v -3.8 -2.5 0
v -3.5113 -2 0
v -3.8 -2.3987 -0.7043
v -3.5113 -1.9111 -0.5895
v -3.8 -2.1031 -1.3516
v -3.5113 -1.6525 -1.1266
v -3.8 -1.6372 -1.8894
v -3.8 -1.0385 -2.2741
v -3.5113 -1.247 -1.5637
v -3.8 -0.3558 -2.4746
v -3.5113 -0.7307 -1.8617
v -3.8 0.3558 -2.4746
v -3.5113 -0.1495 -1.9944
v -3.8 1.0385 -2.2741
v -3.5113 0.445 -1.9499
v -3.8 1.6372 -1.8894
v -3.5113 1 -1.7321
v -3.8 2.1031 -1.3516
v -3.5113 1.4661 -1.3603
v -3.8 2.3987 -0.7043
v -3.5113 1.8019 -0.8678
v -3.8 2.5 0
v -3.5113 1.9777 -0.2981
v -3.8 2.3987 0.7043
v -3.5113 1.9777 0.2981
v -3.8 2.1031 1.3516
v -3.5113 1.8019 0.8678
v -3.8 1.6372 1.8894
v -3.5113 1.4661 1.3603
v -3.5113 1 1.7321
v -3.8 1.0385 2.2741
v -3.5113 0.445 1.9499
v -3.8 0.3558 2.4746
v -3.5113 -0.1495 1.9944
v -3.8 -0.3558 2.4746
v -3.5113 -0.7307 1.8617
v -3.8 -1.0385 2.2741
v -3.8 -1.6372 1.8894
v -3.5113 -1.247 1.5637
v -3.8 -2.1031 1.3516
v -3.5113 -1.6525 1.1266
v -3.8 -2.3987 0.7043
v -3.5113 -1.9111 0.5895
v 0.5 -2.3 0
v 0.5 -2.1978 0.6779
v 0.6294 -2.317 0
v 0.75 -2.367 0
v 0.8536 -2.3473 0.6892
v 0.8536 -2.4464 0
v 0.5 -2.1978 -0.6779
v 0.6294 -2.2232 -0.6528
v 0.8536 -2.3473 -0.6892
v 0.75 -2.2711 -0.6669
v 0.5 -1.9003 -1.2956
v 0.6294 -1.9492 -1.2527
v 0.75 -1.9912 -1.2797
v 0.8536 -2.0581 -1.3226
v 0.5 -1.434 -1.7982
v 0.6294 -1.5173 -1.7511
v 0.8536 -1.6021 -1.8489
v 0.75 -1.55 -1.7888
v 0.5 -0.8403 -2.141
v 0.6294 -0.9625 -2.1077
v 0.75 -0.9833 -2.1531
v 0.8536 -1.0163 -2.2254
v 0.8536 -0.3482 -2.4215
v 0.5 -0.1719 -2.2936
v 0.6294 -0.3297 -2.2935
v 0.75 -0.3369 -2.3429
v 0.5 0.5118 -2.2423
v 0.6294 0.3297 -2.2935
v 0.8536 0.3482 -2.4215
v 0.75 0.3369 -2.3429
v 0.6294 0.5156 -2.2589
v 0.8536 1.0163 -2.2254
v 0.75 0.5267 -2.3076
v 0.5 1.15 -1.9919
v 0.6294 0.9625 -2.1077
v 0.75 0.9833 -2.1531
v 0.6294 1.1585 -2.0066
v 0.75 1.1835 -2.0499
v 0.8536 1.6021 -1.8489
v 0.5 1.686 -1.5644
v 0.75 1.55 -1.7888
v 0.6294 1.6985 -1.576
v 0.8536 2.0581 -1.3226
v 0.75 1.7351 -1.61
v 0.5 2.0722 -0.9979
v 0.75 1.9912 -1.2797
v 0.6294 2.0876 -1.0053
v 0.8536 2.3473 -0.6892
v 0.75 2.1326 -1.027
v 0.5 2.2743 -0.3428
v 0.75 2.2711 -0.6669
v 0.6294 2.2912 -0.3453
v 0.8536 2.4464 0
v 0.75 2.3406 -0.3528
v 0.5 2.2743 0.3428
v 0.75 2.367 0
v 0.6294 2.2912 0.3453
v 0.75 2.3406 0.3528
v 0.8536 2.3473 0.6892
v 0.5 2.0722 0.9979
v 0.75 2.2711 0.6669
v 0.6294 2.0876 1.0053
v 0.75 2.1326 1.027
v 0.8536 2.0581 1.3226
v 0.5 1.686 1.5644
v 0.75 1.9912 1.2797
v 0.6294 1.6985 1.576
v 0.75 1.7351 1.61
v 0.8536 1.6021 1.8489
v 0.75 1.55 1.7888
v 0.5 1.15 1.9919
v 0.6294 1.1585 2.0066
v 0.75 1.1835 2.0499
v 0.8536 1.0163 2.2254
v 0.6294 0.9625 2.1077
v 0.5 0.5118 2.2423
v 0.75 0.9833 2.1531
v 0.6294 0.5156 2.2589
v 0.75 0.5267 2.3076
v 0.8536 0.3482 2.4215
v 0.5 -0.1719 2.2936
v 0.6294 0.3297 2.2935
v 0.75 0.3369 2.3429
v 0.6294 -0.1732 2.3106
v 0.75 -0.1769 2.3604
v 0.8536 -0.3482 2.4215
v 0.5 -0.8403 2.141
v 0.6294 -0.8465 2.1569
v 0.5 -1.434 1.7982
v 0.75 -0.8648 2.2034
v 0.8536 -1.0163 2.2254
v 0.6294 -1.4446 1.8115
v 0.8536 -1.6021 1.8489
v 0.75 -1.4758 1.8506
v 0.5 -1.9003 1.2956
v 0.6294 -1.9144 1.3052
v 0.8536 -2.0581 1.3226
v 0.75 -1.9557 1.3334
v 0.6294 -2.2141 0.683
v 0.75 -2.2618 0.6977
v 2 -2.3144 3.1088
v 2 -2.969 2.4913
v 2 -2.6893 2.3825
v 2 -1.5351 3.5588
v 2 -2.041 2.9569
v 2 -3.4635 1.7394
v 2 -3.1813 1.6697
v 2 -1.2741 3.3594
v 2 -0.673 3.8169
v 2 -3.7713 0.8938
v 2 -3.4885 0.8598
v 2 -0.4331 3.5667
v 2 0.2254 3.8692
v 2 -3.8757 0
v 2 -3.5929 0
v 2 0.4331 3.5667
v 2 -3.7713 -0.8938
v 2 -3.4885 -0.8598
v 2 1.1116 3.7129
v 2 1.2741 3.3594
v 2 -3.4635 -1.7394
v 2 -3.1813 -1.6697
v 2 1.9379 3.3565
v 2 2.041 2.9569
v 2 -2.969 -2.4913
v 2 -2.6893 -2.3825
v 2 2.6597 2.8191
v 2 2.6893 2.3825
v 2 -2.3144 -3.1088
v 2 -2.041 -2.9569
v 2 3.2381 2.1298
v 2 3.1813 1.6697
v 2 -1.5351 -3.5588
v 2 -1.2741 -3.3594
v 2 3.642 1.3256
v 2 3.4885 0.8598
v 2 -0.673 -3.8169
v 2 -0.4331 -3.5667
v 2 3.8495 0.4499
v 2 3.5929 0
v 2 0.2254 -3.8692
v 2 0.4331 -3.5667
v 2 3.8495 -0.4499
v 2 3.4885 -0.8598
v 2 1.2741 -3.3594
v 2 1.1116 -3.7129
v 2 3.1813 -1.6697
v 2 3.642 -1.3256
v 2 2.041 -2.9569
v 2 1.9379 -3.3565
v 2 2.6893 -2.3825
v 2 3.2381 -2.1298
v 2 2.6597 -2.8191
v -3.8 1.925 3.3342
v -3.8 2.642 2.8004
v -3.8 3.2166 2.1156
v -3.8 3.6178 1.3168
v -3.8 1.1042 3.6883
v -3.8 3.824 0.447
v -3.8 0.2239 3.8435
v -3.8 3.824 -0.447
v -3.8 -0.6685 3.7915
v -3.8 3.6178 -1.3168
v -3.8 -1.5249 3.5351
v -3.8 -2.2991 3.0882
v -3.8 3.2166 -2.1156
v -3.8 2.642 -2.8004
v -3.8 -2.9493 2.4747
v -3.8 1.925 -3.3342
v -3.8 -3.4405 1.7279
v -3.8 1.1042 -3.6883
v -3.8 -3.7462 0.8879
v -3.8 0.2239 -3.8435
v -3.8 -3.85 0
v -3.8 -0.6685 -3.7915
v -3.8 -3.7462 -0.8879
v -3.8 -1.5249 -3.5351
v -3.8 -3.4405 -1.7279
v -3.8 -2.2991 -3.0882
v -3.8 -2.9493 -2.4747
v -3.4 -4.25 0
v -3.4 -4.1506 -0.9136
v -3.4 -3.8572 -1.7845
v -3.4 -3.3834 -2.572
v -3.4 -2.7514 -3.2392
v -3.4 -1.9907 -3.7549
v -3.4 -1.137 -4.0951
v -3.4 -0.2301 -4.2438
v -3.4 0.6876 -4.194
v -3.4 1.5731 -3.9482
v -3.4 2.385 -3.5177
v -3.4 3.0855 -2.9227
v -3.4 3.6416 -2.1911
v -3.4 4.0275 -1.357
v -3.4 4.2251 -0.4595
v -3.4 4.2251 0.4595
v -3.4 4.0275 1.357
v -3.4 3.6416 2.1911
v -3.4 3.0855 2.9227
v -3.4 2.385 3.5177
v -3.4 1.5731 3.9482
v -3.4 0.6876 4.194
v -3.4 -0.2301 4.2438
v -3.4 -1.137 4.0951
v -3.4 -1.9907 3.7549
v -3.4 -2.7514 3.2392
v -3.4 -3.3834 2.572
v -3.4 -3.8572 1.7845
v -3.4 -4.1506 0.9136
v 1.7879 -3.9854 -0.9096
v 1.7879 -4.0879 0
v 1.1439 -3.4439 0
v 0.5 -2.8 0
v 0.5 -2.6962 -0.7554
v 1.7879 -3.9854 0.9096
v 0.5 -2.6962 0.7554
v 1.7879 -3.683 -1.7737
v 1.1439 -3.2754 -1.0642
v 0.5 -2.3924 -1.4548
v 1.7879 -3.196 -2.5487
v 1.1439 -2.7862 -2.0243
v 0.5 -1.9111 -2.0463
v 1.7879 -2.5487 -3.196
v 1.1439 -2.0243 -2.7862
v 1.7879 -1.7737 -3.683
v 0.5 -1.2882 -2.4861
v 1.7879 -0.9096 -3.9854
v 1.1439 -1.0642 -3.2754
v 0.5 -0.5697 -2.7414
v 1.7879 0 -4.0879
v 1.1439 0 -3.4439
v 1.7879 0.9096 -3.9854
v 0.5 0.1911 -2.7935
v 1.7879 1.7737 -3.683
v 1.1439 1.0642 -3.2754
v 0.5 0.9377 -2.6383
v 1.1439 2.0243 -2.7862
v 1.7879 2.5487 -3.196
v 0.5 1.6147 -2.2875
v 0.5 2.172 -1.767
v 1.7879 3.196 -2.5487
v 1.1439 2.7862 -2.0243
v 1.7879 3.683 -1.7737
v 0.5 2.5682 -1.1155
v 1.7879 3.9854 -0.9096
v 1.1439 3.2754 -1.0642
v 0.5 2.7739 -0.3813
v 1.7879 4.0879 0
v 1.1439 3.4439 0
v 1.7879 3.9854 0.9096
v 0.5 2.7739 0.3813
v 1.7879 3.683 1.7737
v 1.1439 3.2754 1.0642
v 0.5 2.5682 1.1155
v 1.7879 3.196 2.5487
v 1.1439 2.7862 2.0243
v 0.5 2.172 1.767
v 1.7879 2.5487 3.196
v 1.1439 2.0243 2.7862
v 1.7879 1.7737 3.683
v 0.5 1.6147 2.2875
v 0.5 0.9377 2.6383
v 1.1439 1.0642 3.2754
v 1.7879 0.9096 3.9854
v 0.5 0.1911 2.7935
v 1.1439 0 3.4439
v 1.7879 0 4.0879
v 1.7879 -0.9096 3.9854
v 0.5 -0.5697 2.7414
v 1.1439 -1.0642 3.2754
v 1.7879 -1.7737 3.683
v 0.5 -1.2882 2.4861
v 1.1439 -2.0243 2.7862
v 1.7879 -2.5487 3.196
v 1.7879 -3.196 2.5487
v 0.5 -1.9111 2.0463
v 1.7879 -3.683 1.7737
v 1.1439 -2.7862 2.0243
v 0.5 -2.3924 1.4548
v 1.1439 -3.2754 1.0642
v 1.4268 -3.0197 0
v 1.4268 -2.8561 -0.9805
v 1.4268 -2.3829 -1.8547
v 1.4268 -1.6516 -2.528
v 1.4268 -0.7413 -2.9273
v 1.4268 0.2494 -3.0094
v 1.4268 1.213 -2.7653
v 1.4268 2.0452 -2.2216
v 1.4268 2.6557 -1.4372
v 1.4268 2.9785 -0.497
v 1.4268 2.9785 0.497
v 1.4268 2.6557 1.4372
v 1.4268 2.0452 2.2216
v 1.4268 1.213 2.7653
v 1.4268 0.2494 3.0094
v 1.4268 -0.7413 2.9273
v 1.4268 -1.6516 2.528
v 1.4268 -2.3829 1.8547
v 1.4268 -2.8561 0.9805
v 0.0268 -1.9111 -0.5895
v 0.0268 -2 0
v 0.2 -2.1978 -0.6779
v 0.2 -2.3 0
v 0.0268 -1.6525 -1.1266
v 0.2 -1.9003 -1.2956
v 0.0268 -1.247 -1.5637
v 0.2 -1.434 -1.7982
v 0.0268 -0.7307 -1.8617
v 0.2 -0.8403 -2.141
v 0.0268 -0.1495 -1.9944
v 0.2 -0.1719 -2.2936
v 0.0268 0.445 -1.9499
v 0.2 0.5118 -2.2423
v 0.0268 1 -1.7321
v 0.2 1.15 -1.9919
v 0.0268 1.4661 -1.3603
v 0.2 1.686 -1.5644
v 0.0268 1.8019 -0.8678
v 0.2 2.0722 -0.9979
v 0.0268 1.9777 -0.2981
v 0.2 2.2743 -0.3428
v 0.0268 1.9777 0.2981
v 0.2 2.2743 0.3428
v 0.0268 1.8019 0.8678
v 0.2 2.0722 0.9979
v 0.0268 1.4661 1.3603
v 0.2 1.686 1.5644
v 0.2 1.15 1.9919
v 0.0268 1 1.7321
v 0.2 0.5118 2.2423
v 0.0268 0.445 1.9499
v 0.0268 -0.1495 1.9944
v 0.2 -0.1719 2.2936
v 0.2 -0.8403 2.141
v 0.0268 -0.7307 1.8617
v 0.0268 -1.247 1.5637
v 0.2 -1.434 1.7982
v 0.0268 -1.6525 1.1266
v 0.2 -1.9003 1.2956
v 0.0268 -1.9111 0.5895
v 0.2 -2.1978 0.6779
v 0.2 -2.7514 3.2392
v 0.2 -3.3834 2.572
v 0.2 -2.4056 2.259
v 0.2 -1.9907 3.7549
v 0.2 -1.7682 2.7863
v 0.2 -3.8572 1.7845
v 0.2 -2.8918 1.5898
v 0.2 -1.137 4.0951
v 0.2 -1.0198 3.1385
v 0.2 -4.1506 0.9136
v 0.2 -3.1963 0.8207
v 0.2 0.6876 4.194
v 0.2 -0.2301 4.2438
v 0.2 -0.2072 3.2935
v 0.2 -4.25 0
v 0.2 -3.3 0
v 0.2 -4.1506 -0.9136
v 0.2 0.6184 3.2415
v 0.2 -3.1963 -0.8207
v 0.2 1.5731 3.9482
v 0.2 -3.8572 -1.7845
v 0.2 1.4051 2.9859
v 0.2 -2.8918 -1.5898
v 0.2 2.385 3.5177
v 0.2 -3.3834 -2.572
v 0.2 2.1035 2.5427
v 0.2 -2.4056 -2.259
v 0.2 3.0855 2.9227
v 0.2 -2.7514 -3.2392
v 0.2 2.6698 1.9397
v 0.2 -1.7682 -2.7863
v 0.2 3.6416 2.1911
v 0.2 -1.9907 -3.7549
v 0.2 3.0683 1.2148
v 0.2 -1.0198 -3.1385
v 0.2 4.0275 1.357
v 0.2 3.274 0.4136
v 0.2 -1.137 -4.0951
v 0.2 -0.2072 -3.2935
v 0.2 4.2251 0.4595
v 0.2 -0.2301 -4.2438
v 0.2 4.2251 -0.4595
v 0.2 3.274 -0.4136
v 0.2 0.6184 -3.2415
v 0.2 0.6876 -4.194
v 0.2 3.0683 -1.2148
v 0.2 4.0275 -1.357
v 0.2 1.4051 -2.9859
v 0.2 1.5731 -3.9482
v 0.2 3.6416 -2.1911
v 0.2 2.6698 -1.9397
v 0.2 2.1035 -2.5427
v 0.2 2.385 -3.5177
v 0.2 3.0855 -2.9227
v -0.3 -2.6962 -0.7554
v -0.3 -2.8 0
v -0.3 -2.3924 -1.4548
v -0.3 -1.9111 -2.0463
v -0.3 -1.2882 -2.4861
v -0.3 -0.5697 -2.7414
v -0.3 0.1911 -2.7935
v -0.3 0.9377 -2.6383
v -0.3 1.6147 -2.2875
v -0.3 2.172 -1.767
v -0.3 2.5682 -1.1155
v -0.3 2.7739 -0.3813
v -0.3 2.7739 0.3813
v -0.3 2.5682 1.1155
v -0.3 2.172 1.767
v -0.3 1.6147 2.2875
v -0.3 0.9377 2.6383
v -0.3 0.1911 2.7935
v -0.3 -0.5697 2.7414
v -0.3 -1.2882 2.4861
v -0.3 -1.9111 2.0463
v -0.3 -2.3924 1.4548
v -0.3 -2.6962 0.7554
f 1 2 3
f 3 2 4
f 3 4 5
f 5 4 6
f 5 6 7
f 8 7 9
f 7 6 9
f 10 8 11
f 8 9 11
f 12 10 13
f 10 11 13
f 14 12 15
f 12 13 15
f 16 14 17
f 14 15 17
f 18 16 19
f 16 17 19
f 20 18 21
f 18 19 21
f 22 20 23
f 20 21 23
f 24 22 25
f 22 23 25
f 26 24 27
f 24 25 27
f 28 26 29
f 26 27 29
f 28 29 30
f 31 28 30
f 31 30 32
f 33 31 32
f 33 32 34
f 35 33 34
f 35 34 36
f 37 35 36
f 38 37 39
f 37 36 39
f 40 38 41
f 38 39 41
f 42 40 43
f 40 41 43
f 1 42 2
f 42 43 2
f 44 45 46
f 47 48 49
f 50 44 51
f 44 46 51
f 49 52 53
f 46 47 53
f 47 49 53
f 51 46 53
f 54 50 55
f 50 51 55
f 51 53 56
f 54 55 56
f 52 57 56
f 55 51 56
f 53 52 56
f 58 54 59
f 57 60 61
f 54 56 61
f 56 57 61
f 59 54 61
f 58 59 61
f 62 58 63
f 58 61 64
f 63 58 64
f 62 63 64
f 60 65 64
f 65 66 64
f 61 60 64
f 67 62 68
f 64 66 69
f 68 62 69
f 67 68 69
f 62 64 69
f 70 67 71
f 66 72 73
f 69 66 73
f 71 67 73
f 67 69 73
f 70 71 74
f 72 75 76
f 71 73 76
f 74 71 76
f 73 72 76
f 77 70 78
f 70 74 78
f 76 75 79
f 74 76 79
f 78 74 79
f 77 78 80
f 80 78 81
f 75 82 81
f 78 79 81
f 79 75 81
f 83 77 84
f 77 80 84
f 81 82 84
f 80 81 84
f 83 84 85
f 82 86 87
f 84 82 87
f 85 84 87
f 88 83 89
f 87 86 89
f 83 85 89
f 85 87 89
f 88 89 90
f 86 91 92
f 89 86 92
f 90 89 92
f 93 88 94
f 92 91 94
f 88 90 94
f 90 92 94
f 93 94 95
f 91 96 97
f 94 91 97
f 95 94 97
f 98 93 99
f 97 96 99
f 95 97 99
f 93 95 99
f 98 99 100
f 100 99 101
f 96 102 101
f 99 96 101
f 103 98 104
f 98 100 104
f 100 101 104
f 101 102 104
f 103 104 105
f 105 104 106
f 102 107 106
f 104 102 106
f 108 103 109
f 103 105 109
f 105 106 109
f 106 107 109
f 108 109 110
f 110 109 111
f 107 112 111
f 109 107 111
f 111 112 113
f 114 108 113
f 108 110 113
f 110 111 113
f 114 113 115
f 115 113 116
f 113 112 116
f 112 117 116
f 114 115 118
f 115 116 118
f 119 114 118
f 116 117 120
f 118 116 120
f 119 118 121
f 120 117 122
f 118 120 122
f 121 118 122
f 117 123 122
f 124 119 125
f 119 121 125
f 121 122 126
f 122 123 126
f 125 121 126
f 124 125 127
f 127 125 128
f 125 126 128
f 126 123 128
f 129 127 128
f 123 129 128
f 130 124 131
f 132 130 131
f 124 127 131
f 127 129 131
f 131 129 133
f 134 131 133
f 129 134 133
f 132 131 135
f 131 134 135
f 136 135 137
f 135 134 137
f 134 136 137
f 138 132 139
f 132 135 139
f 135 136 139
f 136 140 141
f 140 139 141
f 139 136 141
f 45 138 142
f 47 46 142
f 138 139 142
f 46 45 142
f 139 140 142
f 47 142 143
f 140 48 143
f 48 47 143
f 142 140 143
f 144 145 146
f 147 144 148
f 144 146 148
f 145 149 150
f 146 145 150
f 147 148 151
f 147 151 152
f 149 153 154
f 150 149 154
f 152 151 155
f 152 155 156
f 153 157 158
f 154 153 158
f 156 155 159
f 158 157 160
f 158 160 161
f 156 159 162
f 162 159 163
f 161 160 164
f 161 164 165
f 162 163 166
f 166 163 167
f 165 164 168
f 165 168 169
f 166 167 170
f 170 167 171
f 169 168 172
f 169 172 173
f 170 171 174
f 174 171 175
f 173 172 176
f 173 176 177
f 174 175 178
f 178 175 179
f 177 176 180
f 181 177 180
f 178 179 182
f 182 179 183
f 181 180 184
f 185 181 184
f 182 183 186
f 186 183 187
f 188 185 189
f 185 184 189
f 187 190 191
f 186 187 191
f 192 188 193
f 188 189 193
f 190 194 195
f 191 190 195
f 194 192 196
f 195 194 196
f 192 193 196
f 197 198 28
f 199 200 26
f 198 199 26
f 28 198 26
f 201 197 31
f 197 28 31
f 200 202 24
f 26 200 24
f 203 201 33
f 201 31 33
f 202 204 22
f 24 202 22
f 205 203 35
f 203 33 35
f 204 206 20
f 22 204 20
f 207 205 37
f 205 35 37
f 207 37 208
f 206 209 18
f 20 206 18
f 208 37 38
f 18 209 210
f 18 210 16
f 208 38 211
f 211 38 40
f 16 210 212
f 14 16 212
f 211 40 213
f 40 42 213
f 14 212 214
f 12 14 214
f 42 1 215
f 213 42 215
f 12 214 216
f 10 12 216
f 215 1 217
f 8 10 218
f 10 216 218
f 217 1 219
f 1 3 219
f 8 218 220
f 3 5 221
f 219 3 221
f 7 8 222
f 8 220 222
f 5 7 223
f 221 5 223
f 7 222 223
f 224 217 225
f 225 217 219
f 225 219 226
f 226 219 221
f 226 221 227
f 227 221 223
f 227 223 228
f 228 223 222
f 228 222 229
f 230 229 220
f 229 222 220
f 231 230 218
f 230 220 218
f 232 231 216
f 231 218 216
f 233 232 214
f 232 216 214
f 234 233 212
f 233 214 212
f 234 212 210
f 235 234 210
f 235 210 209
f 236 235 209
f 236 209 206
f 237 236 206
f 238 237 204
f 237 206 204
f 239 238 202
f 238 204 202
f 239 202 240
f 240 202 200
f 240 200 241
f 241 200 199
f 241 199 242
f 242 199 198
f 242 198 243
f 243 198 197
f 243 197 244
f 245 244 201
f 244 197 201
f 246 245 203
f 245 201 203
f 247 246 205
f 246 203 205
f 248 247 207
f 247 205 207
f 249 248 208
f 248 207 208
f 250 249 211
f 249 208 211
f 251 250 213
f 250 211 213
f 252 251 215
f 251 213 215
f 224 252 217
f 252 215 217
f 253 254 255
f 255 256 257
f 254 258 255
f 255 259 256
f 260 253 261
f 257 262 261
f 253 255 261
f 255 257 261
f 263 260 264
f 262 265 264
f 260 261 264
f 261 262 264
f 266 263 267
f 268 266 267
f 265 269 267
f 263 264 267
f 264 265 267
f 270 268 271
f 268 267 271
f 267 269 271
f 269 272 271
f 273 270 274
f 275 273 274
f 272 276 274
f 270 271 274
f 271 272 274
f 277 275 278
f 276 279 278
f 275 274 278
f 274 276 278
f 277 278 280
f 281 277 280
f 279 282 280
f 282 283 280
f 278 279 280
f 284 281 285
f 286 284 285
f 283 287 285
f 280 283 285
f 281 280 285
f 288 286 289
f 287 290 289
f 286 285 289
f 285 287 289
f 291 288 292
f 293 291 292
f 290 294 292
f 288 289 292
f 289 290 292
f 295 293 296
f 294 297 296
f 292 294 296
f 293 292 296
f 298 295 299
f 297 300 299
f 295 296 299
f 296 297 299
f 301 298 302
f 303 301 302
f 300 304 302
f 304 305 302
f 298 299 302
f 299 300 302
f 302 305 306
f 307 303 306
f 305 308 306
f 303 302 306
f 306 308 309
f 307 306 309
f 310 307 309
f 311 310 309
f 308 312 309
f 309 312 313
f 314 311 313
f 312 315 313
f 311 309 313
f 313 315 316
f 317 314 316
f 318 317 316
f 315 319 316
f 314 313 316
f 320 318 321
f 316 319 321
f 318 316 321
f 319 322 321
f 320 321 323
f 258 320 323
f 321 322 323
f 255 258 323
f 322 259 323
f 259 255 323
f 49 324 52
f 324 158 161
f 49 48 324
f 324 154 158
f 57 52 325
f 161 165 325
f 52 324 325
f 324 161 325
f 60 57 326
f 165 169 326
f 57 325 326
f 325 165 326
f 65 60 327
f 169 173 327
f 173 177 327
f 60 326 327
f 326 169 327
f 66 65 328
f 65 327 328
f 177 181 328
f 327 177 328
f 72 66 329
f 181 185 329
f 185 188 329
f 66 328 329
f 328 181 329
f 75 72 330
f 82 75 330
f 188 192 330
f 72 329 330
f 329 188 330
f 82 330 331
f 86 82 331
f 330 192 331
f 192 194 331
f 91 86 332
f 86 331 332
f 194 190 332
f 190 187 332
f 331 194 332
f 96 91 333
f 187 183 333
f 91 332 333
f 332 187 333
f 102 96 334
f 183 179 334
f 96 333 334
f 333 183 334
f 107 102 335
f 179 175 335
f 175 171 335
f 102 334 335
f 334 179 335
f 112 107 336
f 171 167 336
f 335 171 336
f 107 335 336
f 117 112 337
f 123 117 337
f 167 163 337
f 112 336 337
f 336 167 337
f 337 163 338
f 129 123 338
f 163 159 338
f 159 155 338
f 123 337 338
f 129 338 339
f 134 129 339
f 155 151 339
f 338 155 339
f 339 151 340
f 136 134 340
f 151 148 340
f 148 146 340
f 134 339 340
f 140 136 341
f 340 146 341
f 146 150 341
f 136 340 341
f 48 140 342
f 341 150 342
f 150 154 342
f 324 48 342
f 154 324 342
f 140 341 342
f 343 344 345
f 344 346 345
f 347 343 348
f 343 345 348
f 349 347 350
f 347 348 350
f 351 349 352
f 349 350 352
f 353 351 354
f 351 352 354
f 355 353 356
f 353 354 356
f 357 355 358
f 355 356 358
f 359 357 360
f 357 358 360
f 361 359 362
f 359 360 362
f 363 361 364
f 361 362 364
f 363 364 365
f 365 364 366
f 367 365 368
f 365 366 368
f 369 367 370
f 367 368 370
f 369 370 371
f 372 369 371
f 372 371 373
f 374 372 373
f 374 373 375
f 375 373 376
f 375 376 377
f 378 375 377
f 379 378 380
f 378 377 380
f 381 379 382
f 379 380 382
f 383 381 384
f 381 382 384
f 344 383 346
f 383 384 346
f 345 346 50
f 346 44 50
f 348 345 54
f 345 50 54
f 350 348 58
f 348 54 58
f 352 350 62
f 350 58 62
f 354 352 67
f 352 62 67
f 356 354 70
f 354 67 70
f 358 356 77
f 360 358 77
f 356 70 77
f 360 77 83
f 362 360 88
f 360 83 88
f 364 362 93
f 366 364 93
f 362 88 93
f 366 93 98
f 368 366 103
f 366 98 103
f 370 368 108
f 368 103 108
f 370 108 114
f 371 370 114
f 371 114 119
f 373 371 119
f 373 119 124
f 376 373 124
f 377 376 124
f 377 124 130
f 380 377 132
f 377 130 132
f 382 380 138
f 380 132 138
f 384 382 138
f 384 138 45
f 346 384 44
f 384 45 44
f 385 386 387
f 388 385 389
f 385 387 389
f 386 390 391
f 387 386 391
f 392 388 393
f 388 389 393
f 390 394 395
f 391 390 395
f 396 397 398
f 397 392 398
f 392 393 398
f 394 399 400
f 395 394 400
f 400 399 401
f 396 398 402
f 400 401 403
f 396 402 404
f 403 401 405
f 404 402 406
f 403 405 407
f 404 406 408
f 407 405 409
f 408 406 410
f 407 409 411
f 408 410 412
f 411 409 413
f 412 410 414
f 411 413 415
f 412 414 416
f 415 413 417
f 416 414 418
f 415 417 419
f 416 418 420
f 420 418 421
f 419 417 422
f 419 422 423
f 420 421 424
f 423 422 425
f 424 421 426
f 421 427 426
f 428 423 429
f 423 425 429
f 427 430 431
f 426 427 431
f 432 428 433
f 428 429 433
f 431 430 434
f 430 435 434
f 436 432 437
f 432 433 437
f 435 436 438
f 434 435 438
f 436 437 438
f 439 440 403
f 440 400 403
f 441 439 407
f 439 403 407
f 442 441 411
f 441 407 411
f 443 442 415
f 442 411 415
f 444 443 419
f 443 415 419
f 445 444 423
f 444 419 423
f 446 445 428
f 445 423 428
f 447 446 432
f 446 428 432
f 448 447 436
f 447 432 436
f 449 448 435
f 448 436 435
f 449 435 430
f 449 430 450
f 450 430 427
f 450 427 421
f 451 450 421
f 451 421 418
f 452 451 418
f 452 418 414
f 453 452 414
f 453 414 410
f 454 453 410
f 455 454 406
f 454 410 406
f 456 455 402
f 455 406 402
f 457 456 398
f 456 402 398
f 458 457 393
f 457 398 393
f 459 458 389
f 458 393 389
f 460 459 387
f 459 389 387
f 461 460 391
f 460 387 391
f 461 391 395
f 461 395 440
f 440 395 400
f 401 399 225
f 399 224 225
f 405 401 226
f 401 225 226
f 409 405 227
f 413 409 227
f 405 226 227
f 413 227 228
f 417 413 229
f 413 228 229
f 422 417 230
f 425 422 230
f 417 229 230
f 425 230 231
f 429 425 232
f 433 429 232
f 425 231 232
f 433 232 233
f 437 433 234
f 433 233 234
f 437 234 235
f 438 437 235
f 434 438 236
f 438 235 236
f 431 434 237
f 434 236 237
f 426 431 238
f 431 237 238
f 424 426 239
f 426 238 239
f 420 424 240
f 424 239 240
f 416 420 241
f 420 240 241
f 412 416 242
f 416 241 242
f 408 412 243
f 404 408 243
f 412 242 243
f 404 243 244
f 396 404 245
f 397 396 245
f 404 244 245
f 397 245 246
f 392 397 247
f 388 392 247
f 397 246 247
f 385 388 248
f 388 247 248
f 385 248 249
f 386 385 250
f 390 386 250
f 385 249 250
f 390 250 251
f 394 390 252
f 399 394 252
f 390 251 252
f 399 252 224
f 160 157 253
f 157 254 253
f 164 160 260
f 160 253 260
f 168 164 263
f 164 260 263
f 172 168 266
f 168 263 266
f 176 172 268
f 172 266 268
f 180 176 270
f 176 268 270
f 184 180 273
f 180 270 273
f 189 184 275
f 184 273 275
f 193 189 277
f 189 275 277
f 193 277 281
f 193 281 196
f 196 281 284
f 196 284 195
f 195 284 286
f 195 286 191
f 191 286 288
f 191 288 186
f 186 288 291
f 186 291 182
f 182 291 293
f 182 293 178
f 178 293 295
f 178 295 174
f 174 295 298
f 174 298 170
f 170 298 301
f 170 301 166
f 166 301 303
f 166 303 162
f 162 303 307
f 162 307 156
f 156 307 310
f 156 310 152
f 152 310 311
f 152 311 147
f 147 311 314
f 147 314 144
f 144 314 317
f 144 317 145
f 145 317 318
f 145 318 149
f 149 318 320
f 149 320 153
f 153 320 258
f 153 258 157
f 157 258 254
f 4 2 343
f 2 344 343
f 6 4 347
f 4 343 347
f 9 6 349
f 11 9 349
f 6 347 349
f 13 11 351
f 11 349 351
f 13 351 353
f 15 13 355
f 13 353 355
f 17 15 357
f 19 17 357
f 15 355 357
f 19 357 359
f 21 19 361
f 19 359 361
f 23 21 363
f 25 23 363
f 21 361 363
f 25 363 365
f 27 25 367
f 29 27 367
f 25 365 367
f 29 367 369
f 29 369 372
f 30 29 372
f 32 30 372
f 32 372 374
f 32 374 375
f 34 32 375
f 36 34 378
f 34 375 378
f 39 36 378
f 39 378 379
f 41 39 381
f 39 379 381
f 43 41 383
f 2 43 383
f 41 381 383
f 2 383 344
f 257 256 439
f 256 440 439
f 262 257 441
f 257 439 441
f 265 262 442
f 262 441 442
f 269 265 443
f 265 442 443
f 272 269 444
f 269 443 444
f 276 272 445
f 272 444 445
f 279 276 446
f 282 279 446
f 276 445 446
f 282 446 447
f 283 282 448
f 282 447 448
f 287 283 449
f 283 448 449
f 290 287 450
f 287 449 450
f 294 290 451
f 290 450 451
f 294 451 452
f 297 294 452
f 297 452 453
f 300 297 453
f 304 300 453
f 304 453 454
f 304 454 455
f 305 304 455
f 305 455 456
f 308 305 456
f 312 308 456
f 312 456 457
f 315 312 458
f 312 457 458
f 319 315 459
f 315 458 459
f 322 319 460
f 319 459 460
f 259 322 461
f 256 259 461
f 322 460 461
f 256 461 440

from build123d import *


with BuildPart() as part:
    # Эскиз22 → Revolve 1889 (revolve)
    with BuildSketch(Plane.XY):
        with BuildLine():
            Line((0.5, -2.8), (-0.3, -2.8))
            Line((-0.3, -2.8), (0.2, -3.3))
            Line((0.2, -3.3), (0.2, -4.25))
            Line((0.2, -4.25), (-3.4, -4.25))
            Line((-3.4, -4.25), (-3.8, -3.85))
            Line((-3.8, -3.85), (-3.8, -2.5))
            Line((-3.8, -2.5), (-3.511324865, -2))
            Line((-3.511324865, -2), (0.026794919, -2))
            Line((0.026794919, -2), (0.2, -2.3))
            Line((0.2, -2.3), (0.5, -2.3))
            ThreePointArc((0.5, -2.3), (0.691341716, -2.338060234), (0.853553391, -2.446446609))
            Line((0.853553391, -2.446446609), (2, -3.592893219))
            Line((2, -3.592893219), (2, -3.875735931))
            Line((2, -3.875735931), (1.787867966, -4.087867966))
            Line((1.787867966, -4.087867966), (0.5, -2.8))
        make_face()
    revolve(axis=Axis((0, 0, 0), (1, 0, 0)))


solid = part.part
